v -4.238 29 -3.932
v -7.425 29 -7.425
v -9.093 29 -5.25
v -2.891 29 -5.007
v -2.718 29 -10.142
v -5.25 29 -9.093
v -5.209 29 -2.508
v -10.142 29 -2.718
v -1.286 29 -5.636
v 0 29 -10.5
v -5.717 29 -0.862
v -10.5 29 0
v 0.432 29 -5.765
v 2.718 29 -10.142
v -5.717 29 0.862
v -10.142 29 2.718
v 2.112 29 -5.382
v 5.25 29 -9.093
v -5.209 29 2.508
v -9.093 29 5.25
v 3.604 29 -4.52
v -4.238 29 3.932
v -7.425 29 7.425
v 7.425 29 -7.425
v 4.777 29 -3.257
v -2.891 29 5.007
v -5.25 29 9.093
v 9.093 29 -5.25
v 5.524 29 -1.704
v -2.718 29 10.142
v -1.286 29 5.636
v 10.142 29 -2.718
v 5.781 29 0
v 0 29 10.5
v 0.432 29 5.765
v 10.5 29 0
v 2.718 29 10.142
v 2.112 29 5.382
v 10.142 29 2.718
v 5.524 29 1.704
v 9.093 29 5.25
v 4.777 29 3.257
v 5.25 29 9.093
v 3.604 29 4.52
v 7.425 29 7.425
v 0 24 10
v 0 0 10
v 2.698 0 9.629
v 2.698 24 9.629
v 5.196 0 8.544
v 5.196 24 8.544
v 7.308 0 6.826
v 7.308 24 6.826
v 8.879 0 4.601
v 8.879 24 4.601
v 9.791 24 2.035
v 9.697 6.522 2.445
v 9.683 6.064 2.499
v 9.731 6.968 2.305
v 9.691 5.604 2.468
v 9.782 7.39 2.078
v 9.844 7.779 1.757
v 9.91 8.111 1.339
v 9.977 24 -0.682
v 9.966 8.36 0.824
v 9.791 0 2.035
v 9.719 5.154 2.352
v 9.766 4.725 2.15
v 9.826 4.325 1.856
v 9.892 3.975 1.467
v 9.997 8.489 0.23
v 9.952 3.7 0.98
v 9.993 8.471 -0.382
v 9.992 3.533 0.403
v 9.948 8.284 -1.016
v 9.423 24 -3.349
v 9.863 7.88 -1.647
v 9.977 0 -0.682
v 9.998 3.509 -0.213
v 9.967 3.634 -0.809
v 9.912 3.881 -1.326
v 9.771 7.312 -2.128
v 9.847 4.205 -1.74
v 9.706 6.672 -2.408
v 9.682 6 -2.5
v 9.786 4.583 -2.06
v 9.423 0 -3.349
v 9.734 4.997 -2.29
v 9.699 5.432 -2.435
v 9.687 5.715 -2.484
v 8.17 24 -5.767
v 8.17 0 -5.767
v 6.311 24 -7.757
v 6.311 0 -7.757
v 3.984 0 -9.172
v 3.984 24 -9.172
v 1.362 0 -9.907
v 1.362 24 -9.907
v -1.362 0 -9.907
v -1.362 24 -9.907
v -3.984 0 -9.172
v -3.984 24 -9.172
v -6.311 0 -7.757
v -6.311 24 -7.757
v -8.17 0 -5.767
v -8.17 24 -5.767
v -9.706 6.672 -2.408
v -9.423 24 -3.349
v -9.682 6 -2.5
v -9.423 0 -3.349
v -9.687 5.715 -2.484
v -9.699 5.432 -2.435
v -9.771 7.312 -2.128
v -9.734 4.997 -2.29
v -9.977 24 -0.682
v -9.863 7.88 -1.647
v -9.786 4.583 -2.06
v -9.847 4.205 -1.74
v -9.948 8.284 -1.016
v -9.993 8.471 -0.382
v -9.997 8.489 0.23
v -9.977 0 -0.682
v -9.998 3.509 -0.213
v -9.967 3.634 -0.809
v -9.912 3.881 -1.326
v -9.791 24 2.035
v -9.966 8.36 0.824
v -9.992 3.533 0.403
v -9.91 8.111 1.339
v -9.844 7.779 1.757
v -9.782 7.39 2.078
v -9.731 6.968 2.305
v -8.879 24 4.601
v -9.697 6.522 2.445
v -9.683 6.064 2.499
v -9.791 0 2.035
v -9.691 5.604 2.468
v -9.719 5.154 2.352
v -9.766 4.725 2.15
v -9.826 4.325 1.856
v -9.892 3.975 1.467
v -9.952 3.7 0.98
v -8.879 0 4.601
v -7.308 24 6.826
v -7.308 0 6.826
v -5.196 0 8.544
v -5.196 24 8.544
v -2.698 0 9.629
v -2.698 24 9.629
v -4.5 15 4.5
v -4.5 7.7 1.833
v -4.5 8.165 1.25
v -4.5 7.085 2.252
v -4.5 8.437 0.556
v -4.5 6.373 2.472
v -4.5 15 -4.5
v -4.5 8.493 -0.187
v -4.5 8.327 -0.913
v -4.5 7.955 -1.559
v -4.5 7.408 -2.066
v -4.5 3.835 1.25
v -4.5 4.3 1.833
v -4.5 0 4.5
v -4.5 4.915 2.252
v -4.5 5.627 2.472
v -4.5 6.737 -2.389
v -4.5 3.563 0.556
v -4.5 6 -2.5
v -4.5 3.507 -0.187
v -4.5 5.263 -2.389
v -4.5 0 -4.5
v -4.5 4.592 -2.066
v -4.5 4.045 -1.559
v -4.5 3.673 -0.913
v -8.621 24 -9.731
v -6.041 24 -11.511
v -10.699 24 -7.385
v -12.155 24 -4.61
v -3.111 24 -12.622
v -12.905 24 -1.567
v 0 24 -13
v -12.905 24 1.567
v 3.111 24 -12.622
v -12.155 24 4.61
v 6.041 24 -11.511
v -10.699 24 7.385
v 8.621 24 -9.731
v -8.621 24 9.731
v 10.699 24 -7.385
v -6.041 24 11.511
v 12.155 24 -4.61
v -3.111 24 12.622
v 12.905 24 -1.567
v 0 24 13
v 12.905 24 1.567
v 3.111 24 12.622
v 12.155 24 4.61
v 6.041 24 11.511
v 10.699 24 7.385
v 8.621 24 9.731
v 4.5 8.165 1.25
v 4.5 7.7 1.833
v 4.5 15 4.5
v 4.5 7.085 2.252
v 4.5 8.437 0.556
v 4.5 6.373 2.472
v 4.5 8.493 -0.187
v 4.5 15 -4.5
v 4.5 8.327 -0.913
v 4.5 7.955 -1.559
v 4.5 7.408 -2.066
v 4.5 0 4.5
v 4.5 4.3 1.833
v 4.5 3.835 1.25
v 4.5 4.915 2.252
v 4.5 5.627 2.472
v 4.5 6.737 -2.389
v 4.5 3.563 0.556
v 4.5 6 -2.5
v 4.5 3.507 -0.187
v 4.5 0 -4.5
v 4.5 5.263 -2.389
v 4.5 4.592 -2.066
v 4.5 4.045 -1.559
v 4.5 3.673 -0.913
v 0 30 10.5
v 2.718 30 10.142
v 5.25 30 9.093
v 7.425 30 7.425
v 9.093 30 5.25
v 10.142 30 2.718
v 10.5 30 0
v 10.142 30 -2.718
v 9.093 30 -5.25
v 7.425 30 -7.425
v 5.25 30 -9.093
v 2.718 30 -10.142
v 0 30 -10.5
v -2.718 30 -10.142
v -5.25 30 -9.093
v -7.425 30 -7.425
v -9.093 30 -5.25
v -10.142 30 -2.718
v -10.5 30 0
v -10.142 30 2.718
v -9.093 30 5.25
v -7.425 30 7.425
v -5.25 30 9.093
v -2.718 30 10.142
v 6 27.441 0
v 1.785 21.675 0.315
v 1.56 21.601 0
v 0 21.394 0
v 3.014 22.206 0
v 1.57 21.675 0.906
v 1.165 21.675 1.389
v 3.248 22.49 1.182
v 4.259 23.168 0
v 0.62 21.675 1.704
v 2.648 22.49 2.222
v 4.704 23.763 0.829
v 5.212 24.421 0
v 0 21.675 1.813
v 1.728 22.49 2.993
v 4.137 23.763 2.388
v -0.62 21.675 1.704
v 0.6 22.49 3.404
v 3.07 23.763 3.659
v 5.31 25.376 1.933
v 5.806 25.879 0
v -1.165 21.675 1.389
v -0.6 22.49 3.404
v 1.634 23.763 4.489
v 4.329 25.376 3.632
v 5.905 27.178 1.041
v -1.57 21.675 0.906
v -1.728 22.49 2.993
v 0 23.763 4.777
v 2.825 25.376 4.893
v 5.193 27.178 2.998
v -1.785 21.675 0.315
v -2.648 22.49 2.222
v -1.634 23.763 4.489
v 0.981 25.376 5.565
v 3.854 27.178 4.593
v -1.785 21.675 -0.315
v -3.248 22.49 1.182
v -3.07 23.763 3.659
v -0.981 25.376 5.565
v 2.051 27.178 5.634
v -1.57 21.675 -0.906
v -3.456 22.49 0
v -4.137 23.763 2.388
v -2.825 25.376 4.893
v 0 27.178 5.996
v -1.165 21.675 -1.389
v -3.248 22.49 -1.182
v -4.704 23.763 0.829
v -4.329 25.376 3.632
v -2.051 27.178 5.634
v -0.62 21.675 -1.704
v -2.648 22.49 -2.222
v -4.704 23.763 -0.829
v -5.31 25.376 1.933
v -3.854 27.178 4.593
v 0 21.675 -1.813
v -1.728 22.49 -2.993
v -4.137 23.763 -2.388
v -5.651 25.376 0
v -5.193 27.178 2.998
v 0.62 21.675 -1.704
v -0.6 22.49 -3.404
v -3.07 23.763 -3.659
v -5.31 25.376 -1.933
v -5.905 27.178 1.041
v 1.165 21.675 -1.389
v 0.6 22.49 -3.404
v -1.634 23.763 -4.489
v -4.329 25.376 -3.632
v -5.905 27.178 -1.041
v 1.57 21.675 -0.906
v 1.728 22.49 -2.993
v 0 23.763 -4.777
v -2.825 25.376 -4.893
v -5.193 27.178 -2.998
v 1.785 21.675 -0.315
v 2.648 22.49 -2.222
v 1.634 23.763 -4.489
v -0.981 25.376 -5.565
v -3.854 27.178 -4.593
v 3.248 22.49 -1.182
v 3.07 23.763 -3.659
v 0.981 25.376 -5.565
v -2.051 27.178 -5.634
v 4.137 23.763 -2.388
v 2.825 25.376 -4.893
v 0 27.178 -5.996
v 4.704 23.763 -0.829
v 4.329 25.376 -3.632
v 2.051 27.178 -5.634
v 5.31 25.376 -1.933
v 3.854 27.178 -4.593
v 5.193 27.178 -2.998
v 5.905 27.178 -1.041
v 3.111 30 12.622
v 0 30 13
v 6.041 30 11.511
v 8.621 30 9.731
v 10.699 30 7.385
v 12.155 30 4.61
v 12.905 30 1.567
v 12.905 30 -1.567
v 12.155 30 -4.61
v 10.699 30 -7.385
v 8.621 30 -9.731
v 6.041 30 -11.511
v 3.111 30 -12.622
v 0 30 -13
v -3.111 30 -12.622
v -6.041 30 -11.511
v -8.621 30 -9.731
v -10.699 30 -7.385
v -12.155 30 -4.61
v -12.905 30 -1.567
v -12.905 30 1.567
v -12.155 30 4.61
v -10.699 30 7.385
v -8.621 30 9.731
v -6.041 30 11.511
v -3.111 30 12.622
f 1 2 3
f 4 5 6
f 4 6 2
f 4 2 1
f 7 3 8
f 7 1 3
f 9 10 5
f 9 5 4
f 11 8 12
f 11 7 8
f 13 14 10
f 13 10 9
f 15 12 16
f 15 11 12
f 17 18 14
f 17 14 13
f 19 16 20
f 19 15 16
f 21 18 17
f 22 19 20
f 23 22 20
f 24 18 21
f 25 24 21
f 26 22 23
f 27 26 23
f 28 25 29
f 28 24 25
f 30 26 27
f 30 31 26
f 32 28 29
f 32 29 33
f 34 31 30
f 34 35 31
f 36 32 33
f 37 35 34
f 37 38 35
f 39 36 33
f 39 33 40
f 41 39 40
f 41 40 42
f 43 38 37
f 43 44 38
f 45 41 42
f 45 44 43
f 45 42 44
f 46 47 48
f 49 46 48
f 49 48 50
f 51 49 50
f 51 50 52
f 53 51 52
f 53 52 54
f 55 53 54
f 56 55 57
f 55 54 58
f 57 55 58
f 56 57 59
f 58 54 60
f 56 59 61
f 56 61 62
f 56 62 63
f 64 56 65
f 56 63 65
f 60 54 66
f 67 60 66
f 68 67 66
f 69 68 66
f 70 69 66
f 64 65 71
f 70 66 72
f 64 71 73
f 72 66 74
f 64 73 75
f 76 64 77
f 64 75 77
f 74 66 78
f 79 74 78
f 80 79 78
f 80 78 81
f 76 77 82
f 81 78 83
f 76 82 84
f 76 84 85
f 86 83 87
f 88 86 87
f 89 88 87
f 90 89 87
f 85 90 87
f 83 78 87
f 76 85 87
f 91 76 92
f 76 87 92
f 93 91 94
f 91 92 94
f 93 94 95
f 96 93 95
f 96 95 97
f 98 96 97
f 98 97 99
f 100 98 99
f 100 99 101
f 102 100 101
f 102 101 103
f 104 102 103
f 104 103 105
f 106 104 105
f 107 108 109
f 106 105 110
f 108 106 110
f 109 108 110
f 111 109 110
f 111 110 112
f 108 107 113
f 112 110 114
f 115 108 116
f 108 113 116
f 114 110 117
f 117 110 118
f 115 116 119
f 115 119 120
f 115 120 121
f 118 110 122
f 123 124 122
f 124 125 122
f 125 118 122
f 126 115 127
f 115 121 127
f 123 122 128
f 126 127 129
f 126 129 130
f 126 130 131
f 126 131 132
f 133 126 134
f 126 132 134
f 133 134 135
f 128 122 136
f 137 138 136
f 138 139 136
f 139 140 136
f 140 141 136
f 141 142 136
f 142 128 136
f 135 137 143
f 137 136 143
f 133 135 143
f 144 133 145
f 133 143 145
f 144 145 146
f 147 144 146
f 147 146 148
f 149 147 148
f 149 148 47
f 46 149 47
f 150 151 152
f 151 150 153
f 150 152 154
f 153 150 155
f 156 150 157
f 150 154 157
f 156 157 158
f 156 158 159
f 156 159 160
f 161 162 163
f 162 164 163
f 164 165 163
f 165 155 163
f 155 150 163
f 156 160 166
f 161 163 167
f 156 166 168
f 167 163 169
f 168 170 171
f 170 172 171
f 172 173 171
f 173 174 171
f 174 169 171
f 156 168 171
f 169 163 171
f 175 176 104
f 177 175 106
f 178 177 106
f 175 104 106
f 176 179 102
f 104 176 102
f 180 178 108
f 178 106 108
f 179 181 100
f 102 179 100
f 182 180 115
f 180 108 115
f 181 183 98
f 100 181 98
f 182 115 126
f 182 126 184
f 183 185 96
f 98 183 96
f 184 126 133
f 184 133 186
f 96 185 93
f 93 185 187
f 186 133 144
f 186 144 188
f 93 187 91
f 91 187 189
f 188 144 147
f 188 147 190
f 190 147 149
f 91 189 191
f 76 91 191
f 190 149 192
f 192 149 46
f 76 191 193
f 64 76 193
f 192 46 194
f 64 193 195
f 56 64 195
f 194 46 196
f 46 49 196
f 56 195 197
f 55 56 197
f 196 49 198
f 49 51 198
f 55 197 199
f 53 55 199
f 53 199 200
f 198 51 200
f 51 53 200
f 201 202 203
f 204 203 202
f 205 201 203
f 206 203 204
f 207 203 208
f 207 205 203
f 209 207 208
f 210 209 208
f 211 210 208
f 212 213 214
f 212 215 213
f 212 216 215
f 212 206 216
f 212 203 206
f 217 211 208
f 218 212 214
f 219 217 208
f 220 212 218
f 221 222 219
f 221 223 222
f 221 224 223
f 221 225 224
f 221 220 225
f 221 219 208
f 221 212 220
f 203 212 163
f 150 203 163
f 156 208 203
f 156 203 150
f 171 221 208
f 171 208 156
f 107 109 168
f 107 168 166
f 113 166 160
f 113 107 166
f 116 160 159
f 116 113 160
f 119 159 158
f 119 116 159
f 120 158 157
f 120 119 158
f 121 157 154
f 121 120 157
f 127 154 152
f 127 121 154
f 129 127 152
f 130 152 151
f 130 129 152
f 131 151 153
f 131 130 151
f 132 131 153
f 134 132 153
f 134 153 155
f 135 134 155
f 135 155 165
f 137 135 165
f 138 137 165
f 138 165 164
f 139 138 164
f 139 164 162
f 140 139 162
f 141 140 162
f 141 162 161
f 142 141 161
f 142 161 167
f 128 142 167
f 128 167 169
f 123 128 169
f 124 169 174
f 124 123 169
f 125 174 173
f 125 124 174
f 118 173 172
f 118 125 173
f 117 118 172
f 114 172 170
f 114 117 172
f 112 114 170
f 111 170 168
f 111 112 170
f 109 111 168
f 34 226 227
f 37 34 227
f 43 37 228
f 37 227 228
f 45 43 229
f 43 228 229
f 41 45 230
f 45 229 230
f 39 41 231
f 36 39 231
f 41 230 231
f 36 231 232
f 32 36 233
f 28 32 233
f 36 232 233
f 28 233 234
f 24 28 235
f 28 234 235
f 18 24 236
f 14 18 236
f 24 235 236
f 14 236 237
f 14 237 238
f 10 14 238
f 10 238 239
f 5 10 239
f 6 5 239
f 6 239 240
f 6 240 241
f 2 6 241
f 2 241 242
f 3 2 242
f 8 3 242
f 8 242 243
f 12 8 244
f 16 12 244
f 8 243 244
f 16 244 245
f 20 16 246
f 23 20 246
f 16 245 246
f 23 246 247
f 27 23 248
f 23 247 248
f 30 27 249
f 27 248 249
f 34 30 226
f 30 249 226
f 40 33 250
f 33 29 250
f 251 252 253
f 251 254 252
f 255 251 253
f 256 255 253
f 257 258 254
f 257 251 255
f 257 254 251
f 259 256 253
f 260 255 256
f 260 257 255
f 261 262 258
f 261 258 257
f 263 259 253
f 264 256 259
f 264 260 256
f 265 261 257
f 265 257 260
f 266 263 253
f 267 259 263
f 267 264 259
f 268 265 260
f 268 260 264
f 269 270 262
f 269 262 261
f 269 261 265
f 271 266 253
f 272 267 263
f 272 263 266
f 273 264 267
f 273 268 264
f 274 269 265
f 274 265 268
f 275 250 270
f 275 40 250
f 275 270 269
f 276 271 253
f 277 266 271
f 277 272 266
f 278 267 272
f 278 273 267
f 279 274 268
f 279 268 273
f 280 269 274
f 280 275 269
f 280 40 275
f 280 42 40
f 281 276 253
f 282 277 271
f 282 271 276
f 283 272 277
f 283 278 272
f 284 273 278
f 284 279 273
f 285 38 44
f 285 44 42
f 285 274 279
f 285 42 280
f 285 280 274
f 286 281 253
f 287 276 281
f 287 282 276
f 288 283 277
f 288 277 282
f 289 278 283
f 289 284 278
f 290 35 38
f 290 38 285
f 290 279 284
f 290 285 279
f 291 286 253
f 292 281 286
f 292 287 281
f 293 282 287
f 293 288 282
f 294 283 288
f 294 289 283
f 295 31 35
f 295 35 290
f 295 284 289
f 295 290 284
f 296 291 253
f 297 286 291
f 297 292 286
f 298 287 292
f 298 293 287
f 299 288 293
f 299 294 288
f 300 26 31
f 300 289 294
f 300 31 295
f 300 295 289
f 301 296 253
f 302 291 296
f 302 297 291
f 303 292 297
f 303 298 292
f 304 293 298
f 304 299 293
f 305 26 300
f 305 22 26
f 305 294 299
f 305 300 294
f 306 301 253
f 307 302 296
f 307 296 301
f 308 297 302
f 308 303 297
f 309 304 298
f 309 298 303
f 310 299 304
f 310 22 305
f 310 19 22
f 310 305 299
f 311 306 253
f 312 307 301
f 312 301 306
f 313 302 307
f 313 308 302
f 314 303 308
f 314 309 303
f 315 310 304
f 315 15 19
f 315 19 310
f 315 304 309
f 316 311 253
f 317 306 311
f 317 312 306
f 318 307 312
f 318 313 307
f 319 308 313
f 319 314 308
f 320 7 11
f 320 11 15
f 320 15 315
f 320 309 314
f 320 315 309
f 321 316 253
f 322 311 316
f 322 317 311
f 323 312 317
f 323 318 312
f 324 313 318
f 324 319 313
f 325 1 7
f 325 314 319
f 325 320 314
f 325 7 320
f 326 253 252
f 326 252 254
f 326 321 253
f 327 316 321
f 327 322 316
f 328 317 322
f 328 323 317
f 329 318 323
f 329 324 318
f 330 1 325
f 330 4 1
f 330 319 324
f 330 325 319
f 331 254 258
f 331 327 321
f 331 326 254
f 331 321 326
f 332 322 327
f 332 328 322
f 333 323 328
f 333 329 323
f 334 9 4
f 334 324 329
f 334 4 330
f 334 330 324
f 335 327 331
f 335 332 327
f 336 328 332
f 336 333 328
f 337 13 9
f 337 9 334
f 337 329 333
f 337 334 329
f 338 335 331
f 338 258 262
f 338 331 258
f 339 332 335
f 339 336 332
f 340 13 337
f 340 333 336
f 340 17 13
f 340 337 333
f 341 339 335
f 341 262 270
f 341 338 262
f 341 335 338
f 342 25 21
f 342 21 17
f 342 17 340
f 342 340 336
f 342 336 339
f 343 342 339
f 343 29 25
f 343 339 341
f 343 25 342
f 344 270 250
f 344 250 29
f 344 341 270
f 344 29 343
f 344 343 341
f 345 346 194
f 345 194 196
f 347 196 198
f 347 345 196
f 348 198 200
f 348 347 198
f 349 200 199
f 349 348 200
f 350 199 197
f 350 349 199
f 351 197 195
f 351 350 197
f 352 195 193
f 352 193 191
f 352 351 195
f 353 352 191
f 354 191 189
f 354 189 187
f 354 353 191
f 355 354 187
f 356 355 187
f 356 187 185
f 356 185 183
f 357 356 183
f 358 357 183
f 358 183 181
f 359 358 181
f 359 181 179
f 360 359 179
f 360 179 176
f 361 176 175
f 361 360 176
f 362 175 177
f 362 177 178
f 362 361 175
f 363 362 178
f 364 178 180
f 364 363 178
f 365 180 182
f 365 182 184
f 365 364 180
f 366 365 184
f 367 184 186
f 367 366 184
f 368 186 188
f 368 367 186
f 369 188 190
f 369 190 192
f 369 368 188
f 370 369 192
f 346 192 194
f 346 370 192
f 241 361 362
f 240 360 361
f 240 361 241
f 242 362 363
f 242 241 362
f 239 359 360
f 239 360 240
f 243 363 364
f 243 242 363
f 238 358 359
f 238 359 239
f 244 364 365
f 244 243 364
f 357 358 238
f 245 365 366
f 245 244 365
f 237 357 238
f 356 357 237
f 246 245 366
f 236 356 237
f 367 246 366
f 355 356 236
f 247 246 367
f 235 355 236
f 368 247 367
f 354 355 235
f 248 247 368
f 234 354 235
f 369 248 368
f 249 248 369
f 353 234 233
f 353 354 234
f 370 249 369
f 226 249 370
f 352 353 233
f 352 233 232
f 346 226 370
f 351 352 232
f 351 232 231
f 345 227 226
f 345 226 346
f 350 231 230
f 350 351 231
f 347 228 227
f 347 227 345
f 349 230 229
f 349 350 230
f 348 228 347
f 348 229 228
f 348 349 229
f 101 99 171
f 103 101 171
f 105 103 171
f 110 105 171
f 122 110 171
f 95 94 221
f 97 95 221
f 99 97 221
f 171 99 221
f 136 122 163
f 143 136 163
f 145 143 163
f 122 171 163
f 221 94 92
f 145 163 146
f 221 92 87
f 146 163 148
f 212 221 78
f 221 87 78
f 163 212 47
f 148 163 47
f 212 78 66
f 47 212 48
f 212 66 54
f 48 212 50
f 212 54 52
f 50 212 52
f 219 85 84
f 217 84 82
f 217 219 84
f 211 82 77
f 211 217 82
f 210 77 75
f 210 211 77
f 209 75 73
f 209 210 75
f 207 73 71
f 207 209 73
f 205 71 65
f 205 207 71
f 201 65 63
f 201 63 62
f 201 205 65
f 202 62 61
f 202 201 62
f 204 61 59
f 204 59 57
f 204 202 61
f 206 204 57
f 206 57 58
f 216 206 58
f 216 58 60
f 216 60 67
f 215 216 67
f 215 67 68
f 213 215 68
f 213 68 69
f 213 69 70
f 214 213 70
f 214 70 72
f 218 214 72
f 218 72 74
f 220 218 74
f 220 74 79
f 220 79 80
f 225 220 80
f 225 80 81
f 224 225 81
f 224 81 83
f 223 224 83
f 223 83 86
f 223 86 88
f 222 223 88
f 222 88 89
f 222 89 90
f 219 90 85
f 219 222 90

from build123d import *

# Parameters (mm, degrees)
SKETCH_1_R               = 10
EXTRUDE_1_DEPTH          = 30
SKETCH_2_R               = 13
EXTRUDE_2_DEPTH          = 6
CUT_EXTRUDE_1_DEPTH      = 36.185224172
CUT_EXTRUDE_1_DEPTH_BACK = 36.185224172
SKETCH_3_R               = 2.5
SKETCH_4_W               = 9
SKETCH_4_H               = 9
CUT_EXTRUDE_2_DEPTH      = 15
SKETCH_6_R               = 10.5
CUT_EXTRUDE_3_DEPTH      = 1


with BuildPart() as part:
    # 草图1 → 凸台-拉伸1 (new body)
    with BuildSketch(Plane(origin=(0, 0, 0), x_dir=(1, 0, 0), z_dir=(0, 1, 0))):
        with Locations(Location((0, 0, 0), (0, 0, 270))):
            Circle(SKETCH_1_R)
    extrude(amount=EXTRUDE_1_DEPTH)

    # 草图2 → 凸台-拉伸2 (add)
    with BuildSketch(Plane(origin=(0, 30, 0), x_dir=(1, 0, 0), z_dir=(0, 1, 0))):
        with Locations(Location((0, 0, 0), (0, 0, 270))):
            Circle(SKETCH_2_R)
    extrude(amount=-EXTRUDE_2_DEPTH)

    # 草图3 → 切除-拉伸1 (cut, two sides: drawn at the far end of the back side and taken through both)
    with BuildSketch(Plane(origin=(0, 0, 0), x_dir=(0, 0, -1), z_dir=(1, 0, 0)).offset(-CUT_EXTRUDE_1_DEPTH_BACK)):
        with Locations((0, 6)):
            Circle(SKETCH_3_R)
    extrude(amount=CUT_EXTRUDE_1_DEPTH + CUT_EXTRUDE_1_DEPTH_BACK, mode=Mode.SUBTRACT)

    # 草图4 → 切除-拉伸2 (cut)
    with BuildSketch(Plane(origin=(0, 0, 0), x_dir=(-1, 0, 0), z_dir=(0, -1, 0))):
        Rectangle(SKETCH_4_W, SKETCH_4_H)
    extrude(amount=-CUT_EXTRUDE_2_DEPTH, mode=Mode.SUBTRACT)

    # 草图5 → 切除-旋转1 (revolve, cut)
    with BuildSketch(Plane.XY):
        with BuildLine():
            Line((0, 33.394315723), (0, 21.394315723))
            ThreePointArc((0, 21.394315723), (6, 27.394315723), (0, 33.394315723))
        make_face()
    revolve(axis=Axis((0, 37.883813042, 0), (0, -1, 0)), mode=Mode.SUBTRACT)

    # 草图6 → 切除-拉伸3 (cut)
    with BuildSketch(Plane(origin=(0, 30, 0), x_dir=(1, 0, 0), z_dir=(0, 1, 0))):
        with Locations(Location((0, 0, 0), (0, 0, 270))):
            Circle(SKETCH_6_R)
    extrude(amount=-CUT_EXTRUDE_3_DEPTH, mode=Mode.SUBTRACT)


solid = part.part
